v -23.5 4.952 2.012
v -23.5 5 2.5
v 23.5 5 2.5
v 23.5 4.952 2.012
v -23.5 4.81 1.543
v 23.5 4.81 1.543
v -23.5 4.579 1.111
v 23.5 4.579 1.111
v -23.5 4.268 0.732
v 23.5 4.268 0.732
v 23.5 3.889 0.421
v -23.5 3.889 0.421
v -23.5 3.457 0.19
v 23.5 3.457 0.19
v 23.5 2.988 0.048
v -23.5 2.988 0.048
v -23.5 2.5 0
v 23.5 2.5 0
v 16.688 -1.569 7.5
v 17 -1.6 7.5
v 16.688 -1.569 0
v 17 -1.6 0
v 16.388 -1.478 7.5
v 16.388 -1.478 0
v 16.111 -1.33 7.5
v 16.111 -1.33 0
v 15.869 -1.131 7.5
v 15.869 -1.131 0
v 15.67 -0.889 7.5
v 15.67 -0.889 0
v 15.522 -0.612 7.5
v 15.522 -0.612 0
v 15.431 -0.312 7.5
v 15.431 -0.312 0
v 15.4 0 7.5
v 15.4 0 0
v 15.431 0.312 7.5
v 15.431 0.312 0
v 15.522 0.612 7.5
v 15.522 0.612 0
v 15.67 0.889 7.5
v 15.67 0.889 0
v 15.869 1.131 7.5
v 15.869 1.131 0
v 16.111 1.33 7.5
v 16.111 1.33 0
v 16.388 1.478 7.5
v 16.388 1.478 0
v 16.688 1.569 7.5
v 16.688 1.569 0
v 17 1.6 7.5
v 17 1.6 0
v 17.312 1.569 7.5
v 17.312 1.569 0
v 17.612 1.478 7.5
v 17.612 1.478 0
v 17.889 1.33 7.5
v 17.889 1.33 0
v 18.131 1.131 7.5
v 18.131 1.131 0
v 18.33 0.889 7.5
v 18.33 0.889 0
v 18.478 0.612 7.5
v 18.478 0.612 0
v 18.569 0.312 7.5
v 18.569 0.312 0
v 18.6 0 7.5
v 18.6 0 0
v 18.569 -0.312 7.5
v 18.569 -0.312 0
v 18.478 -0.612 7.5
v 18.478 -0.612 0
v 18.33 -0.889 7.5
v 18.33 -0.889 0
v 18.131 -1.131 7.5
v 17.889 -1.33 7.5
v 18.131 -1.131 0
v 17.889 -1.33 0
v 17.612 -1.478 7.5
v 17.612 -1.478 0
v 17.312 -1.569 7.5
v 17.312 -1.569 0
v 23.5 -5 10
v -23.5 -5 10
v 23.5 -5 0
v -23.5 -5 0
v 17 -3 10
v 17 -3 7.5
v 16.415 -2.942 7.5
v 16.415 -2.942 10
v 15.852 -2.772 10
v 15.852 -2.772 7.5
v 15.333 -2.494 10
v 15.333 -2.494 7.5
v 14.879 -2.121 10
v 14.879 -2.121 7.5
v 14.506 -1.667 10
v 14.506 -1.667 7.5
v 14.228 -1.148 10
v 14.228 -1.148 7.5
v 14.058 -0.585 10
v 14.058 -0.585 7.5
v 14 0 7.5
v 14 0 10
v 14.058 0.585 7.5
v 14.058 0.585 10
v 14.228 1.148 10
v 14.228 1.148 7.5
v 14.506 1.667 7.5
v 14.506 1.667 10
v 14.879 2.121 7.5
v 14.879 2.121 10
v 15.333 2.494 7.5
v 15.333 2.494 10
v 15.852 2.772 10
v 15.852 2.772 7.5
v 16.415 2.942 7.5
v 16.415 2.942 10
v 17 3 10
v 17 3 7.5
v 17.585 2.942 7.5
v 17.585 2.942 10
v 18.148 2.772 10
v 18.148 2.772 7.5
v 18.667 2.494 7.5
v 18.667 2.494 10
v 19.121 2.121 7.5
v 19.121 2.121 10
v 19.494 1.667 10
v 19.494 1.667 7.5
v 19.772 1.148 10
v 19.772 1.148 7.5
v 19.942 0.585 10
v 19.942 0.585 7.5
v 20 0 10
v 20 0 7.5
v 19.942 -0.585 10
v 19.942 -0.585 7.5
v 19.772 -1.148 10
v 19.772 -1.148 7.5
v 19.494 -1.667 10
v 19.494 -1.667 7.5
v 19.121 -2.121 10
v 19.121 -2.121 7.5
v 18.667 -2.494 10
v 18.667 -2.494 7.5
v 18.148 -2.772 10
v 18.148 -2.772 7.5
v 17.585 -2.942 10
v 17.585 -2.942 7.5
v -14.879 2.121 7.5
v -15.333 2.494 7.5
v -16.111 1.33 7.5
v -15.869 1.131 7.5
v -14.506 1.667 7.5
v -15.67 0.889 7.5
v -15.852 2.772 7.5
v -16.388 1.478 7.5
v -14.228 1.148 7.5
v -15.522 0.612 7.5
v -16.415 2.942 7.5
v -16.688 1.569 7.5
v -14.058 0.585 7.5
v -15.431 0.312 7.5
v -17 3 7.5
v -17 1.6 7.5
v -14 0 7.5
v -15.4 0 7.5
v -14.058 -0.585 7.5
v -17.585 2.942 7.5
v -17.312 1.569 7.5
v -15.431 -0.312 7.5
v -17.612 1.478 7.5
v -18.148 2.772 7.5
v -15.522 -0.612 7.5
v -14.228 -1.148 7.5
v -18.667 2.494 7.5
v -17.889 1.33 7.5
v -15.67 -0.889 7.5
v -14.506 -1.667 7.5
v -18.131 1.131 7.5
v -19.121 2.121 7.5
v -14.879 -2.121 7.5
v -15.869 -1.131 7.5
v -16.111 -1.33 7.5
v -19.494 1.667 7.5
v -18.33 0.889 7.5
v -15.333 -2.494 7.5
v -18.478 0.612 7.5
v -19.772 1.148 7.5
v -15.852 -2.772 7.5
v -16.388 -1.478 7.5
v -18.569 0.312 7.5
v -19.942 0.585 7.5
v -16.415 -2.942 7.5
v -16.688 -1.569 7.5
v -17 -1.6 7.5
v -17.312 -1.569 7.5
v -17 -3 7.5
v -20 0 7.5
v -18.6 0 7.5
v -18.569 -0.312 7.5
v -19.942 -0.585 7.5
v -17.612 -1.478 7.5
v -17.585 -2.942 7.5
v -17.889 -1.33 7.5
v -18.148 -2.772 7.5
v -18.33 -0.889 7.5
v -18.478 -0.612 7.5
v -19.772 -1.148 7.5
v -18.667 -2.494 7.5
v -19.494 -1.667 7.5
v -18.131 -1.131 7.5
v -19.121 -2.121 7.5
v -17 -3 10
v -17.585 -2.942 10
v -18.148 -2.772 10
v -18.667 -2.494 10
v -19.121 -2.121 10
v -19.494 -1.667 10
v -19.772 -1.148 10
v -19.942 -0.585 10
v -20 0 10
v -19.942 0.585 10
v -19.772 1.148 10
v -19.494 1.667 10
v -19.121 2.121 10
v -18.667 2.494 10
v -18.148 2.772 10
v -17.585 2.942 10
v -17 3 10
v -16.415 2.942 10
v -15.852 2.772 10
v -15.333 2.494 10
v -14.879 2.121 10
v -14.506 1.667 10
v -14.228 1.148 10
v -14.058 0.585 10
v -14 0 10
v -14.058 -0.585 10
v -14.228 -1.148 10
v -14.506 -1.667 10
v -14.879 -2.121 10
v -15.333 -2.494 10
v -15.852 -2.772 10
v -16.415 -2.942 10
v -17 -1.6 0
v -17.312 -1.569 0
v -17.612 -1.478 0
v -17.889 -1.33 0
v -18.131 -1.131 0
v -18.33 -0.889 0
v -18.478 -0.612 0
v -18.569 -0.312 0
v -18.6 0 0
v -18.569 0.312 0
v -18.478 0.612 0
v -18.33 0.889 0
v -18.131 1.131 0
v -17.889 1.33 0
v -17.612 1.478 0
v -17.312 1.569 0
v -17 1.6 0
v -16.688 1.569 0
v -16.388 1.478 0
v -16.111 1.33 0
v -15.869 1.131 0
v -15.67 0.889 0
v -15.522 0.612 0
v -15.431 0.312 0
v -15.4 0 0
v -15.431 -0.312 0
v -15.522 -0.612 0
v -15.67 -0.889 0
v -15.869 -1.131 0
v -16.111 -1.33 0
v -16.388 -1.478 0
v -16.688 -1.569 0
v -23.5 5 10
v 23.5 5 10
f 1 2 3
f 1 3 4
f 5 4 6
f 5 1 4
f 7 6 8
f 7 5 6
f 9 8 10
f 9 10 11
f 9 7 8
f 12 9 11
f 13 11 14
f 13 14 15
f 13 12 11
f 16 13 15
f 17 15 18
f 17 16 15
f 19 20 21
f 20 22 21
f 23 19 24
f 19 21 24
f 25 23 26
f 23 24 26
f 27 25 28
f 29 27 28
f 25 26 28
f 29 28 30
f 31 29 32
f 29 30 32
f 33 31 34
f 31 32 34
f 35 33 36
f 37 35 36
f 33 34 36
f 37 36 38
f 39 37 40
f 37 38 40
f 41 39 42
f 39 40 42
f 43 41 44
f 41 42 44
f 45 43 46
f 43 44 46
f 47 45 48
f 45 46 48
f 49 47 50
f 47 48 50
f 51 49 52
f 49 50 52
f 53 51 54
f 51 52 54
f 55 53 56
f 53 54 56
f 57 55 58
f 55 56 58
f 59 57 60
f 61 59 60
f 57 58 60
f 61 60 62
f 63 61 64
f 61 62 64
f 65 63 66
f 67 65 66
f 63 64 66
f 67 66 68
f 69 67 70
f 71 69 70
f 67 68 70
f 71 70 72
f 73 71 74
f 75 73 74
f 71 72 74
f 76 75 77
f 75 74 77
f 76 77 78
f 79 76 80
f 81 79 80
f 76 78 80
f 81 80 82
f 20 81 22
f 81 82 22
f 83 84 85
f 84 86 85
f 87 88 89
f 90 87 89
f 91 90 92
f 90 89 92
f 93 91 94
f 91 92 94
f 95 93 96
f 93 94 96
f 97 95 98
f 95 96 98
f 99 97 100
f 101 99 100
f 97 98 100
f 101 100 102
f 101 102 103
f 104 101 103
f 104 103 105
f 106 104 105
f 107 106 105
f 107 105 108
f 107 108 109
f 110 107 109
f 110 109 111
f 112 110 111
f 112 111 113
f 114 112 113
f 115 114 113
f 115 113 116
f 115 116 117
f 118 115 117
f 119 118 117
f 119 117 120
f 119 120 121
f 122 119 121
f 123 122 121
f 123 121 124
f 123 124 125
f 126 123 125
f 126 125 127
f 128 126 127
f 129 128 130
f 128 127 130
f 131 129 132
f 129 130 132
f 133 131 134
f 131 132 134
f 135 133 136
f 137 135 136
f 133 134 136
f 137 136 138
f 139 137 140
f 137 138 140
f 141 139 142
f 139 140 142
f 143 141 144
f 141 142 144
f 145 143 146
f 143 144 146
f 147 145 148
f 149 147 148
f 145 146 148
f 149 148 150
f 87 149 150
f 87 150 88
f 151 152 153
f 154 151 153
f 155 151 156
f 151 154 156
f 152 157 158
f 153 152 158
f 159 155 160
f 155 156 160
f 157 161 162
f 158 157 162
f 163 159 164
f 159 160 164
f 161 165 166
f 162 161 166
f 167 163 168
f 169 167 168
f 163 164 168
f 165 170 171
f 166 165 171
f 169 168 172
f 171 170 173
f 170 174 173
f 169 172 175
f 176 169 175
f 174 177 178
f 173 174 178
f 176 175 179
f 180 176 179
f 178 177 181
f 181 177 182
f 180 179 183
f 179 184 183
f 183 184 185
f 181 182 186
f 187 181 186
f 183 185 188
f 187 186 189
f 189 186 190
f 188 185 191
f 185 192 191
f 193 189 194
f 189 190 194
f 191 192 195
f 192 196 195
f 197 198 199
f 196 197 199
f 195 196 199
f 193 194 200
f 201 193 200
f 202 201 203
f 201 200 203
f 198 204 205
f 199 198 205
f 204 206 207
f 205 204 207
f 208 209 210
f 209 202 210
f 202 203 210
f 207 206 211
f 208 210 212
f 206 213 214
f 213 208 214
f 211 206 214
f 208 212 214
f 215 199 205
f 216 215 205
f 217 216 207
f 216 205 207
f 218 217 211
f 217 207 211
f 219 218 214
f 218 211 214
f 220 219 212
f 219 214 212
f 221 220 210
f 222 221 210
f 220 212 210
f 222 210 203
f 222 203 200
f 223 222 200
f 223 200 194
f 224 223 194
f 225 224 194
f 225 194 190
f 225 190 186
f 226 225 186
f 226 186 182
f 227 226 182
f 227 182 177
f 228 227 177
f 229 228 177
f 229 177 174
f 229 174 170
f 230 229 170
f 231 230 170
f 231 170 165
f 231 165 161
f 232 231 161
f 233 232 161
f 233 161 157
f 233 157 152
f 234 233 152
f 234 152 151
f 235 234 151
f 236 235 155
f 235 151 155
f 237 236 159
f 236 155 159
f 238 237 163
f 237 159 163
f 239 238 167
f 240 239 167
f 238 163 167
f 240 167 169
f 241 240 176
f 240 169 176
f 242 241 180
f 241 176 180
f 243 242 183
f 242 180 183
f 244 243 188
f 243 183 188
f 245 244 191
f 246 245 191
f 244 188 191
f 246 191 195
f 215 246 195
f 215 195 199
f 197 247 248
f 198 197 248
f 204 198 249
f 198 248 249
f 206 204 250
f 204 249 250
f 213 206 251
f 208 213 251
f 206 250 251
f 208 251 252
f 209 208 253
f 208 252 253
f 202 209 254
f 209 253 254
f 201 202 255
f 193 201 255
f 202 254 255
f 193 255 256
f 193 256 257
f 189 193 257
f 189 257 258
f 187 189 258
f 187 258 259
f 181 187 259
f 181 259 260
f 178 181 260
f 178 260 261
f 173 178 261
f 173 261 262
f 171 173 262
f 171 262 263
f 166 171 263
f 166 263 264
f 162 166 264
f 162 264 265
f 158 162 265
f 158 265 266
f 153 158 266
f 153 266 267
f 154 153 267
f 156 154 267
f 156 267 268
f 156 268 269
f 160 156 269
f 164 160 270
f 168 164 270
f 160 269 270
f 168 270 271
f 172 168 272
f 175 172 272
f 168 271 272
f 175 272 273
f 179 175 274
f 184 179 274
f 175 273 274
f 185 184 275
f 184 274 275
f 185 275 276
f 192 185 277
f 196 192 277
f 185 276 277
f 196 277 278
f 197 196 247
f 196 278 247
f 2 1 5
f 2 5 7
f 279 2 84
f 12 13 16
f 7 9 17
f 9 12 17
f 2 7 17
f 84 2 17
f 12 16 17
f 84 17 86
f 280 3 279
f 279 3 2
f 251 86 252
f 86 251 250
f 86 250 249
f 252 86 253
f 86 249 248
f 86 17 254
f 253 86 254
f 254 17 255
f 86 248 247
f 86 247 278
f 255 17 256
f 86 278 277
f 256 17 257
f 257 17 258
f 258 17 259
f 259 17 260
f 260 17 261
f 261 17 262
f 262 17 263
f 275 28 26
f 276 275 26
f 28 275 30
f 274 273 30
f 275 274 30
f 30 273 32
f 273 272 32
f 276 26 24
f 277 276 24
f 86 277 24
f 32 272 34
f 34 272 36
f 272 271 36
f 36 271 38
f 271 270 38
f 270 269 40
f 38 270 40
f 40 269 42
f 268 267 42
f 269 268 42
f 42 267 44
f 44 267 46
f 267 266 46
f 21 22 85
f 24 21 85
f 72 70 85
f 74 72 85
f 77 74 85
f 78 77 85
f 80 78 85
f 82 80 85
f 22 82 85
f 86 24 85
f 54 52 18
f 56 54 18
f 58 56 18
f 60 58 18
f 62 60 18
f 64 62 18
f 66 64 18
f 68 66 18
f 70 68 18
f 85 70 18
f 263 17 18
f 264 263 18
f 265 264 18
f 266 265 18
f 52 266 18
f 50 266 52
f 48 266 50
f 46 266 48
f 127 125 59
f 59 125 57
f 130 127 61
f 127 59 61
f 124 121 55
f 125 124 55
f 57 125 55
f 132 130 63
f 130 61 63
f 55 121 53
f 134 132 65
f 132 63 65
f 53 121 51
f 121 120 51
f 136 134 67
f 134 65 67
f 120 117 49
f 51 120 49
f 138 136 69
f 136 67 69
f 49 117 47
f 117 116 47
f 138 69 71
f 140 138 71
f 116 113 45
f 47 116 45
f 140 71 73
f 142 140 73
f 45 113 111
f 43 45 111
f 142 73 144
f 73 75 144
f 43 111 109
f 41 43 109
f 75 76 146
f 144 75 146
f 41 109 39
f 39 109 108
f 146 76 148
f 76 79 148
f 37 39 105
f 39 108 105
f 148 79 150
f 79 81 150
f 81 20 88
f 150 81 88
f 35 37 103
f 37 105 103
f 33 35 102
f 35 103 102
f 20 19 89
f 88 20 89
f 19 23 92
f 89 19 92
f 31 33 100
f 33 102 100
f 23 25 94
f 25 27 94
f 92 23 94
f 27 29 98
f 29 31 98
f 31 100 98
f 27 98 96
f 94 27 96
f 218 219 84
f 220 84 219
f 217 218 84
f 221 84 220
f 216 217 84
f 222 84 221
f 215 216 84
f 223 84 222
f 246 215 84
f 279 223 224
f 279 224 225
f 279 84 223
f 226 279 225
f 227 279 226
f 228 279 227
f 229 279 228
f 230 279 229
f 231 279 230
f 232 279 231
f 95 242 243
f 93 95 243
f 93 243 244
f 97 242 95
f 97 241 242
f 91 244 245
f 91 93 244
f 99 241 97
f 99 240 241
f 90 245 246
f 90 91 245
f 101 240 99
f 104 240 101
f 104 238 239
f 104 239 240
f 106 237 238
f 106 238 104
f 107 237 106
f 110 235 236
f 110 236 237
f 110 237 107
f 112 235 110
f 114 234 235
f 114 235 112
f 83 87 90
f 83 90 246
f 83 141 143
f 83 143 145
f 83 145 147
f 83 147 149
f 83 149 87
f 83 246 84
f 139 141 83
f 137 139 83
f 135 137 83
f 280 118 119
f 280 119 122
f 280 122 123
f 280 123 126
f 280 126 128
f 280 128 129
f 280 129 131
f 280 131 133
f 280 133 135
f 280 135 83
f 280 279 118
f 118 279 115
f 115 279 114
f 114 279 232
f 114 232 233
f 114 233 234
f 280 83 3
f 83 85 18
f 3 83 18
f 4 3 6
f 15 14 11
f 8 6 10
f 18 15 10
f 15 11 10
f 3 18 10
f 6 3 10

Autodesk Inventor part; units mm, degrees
ref_plane "YZ Plane" through (0, 0, 0) normal (1, 0, 0) x (0, 1, 0)
ref_plane "XZ Plane" through (0, 0, 0) normal (0, 1, 0) x (-1, 0, 0)
ref_plane "XY Plane" through (0, 0, 0) normal (0, 0, 1) x (1, 0, 0)
sketch "Sketch1" plane through (0, 0, 0) normal (0, 0, 1) x (1, 0, 0)
  line L0 (-23.5, -5) -> (23.5, -5)
  line L1 (23.5, -5) -> (23.5, 5)
  line L2 (23.5, 5) -> (-23.5, 5)
  line L3 (-23.5, 5) -> (-23.5, -5)
  line L4 (-23.5, -5) -> (23.5, 5) construction
  line L5 (23.5, -5) -> (-23.5, 5) construction
  point P0 (0, 0)
  dimension "d0" = 47
  dimension "d1" = 10
extrude "Extrusion1" add sketch "Sketch1" along normal blind 10
sketch "Sketch2" plane through (0, 0, 10) normal (0, 0, 1) x (1, 0, 0)
  line L0 (-23.5, 5) -> (-23.5, -5) projected
  line L1 (-23.5, 0) -> (-17, 0)
  line L2 (-17, 0) -> (17, 0)
  point P0 (0, 0)
  dimension "d4" = 6.5
  dimension "d5" = 34
hole "Hole1" at (-17, 0, 10) at (17, 0, 10) direction (0, 0, -1) diameter 3.2 end through all counterbore diameter 6 counterbore depth 2.5
fillet "Fillet1" radius 2.5 1 edges at (0, 5, 0)
properties part number "Satupofa"
